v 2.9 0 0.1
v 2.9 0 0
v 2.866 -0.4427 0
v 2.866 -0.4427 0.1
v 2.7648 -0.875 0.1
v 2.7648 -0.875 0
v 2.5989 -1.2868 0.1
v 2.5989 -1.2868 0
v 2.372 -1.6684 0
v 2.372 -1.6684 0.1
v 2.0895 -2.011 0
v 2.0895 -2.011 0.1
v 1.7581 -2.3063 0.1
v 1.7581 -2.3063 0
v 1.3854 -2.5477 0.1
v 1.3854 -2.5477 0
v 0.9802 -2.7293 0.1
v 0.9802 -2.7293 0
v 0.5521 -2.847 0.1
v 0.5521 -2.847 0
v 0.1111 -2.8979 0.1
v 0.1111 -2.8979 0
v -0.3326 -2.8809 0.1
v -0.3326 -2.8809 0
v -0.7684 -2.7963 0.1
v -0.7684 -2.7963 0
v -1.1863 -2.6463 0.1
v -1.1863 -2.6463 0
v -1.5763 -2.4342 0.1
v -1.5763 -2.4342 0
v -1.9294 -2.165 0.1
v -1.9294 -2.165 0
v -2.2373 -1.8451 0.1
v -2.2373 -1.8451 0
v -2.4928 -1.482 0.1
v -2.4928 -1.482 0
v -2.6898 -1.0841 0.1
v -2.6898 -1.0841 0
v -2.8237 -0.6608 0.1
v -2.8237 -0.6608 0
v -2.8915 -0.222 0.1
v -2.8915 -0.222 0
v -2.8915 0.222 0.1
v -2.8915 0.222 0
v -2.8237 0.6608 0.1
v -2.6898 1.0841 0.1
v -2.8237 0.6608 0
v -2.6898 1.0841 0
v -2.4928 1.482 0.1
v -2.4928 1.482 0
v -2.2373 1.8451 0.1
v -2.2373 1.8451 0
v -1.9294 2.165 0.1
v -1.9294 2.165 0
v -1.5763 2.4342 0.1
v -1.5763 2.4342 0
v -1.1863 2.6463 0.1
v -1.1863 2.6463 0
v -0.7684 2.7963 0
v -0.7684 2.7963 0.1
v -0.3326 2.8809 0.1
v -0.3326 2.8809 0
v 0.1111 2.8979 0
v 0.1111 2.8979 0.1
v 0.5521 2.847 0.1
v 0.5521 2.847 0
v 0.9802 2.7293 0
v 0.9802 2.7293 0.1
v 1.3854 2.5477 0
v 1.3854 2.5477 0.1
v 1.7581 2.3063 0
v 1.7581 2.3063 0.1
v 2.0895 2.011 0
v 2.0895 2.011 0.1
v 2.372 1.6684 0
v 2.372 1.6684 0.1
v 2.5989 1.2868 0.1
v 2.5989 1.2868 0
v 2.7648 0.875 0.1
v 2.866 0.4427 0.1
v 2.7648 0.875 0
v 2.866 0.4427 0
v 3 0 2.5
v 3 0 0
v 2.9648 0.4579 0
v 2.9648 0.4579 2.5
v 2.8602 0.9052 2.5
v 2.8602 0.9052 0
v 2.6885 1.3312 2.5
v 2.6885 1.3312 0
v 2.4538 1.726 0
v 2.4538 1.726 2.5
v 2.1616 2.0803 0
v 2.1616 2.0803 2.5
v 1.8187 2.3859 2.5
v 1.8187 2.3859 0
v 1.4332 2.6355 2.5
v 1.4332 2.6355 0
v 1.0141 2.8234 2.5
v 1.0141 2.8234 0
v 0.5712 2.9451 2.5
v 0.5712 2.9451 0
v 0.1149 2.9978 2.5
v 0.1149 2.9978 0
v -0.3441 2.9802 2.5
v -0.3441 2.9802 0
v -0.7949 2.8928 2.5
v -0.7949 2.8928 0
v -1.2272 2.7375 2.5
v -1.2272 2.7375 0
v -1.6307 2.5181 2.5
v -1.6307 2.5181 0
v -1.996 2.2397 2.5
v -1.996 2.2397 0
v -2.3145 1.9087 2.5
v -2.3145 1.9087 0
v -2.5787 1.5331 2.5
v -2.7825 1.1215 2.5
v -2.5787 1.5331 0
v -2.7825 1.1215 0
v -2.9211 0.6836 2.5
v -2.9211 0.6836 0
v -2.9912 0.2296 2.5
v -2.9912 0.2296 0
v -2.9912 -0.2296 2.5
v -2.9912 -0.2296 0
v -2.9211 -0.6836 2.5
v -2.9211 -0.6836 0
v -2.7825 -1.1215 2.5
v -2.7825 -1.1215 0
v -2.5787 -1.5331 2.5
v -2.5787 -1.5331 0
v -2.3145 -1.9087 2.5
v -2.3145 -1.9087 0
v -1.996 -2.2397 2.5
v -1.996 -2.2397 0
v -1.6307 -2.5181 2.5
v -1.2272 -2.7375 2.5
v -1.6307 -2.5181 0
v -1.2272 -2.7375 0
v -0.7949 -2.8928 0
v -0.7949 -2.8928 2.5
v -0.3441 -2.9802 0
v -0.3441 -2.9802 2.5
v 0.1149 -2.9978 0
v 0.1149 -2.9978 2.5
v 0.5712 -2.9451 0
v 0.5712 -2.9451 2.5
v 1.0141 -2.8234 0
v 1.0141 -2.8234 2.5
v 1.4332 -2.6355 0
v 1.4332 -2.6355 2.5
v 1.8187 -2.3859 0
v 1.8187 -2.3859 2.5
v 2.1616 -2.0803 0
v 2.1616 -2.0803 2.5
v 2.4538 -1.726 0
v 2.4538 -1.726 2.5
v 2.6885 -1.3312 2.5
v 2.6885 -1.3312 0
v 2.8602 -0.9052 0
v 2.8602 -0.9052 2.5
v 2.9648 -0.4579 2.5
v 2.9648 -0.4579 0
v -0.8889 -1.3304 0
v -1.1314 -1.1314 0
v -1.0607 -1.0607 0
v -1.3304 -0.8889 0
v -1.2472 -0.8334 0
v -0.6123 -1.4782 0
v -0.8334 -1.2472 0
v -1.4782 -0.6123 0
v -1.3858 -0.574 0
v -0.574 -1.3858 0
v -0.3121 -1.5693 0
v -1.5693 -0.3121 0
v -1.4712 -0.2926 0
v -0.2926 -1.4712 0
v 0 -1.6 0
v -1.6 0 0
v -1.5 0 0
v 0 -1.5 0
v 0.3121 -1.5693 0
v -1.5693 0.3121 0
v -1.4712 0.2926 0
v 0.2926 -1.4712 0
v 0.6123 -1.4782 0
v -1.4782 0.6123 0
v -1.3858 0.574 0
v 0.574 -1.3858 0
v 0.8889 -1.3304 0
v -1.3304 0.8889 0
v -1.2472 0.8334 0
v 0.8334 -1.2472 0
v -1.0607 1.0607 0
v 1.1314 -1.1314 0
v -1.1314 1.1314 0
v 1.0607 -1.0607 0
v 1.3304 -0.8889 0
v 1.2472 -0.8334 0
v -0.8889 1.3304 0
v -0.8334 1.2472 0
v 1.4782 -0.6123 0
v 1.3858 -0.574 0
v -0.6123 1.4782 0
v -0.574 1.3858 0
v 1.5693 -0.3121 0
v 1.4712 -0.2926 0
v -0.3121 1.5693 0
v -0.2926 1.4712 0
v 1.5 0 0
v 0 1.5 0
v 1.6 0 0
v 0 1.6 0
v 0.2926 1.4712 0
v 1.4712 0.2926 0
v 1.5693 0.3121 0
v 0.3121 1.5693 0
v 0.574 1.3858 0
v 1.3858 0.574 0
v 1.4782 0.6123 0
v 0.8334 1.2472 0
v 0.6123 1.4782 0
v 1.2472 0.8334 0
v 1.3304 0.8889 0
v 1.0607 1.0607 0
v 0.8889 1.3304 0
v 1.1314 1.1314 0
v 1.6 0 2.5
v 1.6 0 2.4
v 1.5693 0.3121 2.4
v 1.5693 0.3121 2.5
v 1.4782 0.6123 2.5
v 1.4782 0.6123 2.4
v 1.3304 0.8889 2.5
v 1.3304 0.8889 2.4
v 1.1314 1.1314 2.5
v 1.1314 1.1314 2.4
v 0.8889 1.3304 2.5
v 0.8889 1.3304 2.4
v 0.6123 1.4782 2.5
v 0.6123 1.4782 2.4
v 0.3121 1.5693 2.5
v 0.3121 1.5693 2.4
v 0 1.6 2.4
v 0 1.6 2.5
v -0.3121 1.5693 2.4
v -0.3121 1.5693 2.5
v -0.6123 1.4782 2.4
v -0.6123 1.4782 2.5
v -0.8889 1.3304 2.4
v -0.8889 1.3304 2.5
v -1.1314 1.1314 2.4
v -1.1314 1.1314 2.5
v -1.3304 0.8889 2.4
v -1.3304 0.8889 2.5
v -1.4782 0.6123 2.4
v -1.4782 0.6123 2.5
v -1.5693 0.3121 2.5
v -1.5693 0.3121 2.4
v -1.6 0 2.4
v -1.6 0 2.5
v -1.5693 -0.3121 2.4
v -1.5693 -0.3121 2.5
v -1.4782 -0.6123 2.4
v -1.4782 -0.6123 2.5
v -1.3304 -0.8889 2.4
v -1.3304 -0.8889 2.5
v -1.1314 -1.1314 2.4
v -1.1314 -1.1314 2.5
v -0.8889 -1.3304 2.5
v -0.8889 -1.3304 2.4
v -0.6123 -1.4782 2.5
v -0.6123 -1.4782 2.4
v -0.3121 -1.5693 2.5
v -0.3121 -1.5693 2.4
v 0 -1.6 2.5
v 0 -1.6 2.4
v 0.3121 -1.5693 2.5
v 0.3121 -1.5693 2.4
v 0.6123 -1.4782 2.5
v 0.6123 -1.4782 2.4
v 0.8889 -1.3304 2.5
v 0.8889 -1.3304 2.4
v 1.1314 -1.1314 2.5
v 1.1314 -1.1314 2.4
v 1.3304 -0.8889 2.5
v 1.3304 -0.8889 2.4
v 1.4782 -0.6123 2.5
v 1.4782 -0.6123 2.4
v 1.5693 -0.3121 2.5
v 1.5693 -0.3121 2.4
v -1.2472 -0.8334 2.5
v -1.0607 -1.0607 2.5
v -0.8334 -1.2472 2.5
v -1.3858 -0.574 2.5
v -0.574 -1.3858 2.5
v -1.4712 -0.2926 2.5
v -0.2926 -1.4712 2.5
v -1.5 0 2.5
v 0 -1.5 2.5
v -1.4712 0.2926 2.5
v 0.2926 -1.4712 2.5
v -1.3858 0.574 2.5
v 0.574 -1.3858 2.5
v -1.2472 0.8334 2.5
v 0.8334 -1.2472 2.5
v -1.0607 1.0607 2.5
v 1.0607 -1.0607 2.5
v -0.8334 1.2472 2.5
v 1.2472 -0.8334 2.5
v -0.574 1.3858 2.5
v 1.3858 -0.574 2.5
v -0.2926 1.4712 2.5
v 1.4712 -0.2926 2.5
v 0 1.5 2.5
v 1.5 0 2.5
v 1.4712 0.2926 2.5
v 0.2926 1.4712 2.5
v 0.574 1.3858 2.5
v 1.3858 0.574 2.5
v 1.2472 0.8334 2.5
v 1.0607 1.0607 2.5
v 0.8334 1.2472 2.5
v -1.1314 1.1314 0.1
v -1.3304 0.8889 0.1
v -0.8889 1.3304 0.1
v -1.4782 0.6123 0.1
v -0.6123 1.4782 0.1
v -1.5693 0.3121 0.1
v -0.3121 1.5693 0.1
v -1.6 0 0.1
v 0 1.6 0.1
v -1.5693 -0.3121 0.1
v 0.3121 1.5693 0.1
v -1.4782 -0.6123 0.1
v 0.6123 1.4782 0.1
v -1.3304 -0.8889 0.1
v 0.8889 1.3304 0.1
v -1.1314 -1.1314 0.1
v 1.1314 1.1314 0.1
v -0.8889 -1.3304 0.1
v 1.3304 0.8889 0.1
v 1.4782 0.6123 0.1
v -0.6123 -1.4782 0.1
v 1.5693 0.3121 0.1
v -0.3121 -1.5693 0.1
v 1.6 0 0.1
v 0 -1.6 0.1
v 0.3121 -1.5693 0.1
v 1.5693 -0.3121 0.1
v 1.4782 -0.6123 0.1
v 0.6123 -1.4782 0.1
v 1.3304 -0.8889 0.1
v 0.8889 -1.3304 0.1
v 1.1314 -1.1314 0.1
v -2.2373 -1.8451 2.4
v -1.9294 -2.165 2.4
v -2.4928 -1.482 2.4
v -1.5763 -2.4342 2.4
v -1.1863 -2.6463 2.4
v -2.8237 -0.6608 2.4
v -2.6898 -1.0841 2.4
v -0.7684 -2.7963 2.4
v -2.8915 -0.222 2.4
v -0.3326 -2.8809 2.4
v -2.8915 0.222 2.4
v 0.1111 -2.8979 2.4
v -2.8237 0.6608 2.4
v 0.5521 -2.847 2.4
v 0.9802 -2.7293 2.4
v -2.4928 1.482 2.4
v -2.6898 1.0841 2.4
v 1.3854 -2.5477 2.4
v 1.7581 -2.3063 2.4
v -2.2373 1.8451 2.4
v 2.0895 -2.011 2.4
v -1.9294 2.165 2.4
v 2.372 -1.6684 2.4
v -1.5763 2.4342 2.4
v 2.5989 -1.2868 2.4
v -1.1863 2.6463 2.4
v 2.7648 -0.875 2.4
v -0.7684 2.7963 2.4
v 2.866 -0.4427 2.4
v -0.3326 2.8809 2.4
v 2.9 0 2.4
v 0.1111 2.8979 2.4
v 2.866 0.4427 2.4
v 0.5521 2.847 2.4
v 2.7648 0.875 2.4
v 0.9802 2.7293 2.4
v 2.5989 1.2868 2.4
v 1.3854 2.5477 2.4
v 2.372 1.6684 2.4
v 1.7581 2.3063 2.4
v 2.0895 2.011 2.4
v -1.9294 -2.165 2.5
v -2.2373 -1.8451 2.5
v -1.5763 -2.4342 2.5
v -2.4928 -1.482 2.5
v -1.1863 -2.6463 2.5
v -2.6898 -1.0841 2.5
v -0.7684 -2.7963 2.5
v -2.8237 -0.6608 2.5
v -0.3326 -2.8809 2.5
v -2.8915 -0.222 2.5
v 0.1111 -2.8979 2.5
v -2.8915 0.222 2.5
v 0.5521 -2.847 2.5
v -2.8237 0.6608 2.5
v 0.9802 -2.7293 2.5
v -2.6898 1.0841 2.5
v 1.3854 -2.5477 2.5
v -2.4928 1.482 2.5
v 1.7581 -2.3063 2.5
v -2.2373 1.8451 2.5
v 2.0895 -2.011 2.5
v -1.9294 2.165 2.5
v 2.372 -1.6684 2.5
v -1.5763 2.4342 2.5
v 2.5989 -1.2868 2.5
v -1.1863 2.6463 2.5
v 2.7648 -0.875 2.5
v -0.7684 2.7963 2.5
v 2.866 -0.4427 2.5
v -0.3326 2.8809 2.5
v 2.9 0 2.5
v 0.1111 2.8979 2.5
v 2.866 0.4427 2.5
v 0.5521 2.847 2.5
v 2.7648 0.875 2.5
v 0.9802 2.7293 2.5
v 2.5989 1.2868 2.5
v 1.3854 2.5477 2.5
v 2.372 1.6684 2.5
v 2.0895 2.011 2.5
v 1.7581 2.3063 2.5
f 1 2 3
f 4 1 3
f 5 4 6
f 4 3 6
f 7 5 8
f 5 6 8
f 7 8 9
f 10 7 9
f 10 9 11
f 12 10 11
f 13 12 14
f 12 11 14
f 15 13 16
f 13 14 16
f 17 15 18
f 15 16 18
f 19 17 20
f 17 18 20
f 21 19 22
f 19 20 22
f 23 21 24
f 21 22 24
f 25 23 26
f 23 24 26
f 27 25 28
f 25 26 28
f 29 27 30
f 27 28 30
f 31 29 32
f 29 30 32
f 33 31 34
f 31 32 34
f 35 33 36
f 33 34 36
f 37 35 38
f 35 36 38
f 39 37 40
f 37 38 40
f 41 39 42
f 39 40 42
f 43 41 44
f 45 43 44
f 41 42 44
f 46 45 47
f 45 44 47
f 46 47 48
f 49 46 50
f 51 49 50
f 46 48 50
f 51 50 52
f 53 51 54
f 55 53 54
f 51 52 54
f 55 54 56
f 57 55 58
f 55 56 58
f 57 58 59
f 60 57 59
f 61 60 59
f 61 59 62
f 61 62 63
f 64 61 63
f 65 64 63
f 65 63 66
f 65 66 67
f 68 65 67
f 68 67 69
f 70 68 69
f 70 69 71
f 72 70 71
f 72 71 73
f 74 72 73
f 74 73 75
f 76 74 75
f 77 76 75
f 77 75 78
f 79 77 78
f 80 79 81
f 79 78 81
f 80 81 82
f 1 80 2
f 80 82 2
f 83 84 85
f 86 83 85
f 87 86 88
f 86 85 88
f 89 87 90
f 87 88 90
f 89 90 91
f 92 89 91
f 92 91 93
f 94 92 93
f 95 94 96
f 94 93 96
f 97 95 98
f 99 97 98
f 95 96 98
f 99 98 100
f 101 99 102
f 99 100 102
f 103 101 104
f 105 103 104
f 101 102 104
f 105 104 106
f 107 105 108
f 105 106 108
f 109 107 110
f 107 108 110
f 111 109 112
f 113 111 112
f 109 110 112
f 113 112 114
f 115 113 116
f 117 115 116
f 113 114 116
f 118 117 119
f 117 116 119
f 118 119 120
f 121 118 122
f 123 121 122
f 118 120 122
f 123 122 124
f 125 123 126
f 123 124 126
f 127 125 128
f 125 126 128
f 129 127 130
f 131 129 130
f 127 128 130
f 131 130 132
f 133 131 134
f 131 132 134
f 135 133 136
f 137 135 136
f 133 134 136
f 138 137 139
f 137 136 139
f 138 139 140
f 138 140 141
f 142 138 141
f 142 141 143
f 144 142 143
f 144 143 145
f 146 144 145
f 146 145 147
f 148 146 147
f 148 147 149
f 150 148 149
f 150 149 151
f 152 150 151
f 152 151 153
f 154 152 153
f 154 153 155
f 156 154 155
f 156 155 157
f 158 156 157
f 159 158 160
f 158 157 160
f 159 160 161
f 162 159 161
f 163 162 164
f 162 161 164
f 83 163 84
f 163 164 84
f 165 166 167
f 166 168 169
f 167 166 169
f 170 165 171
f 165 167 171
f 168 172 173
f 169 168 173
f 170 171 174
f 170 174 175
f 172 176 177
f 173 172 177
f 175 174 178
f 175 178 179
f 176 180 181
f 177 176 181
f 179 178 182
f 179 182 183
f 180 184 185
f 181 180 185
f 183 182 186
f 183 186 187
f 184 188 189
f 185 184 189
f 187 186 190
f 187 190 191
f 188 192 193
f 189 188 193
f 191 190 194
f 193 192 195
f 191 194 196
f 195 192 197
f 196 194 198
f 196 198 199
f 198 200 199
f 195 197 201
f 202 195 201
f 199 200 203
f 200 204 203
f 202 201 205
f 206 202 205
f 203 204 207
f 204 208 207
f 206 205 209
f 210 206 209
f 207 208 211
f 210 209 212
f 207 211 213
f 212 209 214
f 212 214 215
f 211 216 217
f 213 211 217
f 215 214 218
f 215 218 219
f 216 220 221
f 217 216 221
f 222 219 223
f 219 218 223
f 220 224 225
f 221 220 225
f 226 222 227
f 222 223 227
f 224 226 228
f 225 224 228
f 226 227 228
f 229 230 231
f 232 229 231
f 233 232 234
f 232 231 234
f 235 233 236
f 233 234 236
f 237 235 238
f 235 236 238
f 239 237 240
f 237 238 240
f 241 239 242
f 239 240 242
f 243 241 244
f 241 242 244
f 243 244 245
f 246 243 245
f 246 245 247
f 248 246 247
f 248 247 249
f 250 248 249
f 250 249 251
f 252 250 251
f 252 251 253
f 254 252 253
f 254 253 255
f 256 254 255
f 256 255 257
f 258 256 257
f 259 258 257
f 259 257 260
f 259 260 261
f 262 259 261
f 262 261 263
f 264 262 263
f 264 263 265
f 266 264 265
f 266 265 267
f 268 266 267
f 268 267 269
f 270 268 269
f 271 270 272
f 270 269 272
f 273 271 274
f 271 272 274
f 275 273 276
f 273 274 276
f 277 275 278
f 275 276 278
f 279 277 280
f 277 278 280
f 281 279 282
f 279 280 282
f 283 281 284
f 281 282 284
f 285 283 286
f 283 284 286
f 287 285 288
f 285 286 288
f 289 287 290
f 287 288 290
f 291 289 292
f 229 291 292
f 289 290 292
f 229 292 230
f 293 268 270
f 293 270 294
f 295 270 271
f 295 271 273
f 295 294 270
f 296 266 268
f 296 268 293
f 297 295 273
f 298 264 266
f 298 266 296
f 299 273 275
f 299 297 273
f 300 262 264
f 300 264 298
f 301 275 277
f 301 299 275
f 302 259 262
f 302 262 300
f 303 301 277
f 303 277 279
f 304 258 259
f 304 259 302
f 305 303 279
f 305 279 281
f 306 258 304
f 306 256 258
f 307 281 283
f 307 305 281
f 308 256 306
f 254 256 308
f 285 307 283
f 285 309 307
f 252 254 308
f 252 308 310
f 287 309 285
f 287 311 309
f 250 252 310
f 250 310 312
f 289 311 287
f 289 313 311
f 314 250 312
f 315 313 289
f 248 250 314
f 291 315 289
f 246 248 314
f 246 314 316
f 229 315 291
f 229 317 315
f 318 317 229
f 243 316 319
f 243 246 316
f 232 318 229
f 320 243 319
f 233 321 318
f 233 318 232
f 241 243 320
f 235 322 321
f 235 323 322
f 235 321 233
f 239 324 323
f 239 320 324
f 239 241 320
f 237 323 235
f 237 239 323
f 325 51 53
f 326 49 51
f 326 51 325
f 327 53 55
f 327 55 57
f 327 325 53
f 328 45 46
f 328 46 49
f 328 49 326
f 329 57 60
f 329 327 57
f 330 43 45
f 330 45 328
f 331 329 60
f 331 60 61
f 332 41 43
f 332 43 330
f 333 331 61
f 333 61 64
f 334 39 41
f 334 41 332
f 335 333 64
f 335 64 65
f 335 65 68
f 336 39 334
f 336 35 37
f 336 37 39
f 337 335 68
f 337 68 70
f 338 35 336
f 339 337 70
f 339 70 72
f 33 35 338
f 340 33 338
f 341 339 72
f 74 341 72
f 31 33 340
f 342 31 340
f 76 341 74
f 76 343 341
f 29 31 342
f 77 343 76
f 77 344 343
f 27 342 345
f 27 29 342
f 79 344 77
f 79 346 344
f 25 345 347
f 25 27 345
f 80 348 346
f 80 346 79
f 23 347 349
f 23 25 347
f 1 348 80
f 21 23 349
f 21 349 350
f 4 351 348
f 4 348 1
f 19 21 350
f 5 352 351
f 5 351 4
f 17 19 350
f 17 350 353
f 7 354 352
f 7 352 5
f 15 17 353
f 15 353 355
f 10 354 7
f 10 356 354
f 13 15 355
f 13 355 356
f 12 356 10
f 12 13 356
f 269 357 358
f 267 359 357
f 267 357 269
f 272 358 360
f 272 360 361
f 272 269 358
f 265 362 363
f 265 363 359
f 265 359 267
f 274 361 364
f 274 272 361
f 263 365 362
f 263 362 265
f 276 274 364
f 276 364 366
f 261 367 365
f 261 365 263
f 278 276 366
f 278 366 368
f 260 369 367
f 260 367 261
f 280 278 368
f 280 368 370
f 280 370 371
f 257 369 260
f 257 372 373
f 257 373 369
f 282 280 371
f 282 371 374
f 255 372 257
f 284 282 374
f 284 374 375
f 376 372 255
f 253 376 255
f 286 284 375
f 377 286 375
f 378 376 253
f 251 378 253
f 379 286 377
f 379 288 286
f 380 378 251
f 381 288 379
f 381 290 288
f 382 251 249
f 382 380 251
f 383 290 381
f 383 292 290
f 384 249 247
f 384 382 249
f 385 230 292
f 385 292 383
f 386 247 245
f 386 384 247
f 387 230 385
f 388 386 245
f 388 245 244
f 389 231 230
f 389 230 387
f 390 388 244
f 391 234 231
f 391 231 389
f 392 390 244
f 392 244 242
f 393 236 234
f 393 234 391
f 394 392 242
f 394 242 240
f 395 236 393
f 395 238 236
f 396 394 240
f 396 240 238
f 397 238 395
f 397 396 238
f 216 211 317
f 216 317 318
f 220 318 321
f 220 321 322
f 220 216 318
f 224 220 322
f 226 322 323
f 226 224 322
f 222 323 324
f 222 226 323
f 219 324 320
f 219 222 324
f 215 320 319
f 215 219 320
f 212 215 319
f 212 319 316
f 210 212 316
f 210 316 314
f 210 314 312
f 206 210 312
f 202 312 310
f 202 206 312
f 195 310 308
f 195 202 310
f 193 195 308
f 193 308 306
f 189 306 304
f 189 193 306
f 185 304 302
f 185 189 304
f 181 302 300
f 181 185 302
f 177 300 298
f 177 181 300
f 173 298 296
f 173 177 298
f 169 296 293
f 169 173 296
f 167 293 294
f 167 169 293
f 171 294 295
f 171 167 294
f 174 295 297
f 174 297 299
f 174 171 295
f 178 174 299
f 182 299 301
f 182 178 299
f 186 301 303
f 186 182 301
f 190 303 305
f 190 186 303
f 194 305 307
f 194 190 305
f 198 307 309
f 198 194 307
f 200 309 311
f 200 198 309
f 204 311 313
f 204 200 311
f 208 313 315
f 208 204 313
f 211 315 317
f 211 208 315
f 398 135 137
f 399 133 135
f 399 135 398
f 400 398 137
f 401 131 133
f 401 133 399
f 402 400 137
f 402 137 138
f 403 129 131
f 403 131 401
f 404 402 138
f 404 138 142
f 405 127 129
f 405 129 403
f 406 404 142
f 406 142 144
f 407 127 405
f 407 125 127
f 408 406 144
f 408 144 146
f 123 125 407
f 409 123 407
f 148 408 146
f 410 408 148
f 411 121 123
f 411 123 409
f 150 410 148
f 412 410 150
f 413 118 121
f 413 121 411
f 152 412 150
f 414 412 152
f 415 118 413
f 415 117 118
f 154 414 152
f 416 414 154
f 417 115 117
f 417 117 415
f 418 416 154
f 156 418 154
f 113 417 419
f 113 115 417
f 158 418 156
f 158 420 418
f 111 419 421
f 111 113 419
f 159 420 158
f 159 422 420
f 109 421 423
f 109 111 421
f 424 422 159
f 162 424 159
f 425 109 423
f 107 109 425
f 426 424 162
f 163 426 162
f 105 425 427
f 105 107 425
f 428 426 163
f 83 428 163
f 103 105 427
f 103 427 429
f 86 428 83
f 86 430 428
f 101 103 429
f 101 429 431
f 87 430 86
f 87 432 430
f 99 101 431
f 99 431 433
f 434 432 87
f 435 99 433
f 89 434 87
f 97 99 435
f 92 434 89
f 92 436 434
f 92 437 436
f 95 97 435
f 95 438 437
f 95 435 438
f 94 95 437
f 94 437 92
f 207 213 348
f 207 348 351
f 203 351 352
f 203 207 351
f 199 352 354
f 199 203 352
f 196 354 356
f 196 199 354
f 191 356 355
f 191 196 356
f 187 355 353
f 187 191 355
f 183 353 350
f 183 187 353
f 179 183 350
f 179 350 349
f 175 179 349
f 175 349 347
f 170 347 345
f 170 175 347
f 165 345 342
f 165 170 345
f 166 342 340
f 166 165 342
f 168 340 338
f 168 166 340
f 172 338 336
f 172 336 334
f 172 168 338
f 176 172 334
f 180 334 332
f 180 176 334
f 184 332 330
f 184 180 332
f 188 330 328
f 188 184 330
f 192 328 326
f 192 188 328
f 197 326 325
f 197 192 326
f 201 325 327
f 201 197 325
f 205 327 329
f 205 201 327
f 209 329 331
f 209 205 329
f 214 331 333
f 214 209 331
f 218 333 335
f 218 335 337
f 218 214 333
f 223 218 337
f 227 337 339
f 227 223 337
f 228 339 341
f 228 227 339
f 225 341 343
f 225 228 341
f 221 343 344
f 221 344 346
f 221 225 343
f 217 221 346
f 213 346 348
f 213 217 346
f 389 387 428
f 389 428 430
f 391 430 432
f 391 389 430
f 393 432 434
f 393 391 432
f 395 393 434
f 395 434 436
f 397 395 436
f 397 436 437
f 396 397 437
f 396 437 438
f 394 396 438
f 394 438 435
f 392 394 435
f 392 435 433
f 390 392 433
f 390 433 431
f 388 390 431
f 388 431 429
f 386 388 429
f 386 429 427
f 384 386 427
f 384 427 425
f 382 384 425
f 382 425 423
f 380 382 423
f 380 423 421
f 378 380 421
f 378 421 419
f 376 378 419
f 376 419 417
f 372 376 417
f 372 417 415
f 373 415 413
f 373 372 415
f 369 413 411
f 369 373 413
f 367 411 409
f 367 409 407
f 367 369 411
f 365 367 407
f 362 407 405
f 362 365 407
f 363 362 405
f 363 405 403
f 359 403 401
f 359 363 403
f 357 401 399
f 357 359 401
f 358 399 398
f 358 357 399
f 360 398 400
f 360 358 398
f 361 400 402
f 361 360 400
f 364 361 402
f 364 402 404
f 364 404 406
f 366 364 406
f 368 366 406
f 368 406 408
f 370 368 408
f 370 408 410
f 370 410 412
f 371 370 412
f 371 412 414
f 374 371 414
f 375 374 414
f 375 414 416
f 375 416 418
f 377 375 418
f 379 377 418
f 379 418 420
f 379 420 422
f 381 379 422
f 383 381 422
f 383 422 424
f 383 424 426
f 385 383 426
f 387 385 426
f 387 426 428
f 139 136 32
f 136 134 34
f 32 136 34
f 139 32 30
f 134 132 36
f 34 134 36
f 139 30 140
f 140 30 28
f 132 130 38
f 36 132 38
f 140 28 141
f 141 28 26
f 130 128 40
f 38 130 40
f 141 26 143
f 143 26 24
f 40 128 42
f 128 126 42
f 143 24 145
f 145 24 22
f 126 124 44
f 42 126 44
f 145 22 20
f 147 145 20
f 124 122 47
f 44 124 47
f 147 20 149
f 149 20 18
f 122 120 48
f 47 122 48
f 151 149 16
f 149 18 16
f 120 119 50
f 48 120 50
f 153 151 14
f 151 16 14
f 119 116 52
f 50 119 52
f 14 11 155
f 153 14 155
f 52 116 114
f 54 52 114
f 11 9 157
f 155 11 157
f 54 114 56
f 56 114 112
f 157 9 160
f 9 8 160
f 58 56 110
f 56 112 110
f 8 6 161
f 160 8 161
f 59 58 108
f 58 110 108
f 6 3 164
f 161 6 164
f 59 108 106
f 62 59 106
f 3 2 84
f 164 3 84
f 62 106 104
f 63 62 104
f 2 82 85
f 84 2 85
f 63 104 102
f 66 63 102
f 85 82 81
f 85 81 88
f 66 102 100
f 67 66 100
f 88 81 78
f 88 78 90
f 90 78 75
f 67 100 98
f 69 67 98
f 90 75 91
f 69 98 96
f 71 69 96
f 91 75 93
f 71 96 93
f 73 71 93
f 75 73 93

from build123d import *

# Parameters (mm, degrees)
CROQUIS1_R                = 1.6
CROQUIS1_R_2              = 1.5
SALIENTE_EXTRUIR1_DEPTH   = 2.5
CROQUIS1_R_3              = 3
CROQUIS1_R_4              = 2.9
SALIENTE_EXTRUIR1_2_DEPTH = 2.5
CROQUIS2_R                = 2.9
CROQUIS2_R_2              = 1.6
SALIENTE_EXTRUIR4_DEPTH   = 2.4
CROQUIS3_R                = 2.9
CROQUIS3_R_2              = 1.6
CORTAR_EXTRUIR1_DEPTH     = 0.1


with BuildPart() as part:
    # Croquis1 → Saliente-Extruir1 (new body)
    with BuildSketch(Plane.XY):
        Circle(CROQUIS1_R)
        Circle(CROQUIS1_R_2, mode=Mode.SUBTRACT)
    extrude(amount=SALIENTE_EXTRUIR1_DEPTH)



with BuildPart() as body_2:
    # Croquis1 → Saliente-Extruir1 2 (new body)
    with BuildSketch(Plane.XY):
        Circle(CROQUIS1_R_3)
        Circle(CROQUIS1_R_4, mode=Mode.SUBTRACT)
    extrude(amount=SALIENTE_EXTRUIR1_2_DEPTH)


with BuildPart() as part_1:
    add(part.part)

    add(body_2.part)  # Saliente-Extruir4 merges body 2
    # Croquis2 → Saliente-Extruir4 (add)
    with BuildSketch(Plane.XY):
        Circle(CROQUIS2_R)
        Circle(CROQUIS2_R_2, mode=Mode.SUBTRACT)
    extrude(amount=SALIENTE_EXTRUIR4_DEPTH)

    # Croquis3 → Cortar-Extruir1 (cut)
    with BuildSketch(Plane(origin=(0, 0, 0), x_dir=(-1, 0, 0), z_dir=(0, 0, -1))):
        with Locations(Location((0, 0, 0), (0, 0, 180))):
            Circle(CROQUIS3_R)
        with Locations(Location((0, 0, 0), (0, 0, 180))):
            Circle(CROQUIS3_R_2, mode=Mode.SUBTRACT)
    extrude(amount=-CORTAR_EXTRUIR1_DEPTH, mode=Mode.SUBTRACT)


solid = part_1.part
